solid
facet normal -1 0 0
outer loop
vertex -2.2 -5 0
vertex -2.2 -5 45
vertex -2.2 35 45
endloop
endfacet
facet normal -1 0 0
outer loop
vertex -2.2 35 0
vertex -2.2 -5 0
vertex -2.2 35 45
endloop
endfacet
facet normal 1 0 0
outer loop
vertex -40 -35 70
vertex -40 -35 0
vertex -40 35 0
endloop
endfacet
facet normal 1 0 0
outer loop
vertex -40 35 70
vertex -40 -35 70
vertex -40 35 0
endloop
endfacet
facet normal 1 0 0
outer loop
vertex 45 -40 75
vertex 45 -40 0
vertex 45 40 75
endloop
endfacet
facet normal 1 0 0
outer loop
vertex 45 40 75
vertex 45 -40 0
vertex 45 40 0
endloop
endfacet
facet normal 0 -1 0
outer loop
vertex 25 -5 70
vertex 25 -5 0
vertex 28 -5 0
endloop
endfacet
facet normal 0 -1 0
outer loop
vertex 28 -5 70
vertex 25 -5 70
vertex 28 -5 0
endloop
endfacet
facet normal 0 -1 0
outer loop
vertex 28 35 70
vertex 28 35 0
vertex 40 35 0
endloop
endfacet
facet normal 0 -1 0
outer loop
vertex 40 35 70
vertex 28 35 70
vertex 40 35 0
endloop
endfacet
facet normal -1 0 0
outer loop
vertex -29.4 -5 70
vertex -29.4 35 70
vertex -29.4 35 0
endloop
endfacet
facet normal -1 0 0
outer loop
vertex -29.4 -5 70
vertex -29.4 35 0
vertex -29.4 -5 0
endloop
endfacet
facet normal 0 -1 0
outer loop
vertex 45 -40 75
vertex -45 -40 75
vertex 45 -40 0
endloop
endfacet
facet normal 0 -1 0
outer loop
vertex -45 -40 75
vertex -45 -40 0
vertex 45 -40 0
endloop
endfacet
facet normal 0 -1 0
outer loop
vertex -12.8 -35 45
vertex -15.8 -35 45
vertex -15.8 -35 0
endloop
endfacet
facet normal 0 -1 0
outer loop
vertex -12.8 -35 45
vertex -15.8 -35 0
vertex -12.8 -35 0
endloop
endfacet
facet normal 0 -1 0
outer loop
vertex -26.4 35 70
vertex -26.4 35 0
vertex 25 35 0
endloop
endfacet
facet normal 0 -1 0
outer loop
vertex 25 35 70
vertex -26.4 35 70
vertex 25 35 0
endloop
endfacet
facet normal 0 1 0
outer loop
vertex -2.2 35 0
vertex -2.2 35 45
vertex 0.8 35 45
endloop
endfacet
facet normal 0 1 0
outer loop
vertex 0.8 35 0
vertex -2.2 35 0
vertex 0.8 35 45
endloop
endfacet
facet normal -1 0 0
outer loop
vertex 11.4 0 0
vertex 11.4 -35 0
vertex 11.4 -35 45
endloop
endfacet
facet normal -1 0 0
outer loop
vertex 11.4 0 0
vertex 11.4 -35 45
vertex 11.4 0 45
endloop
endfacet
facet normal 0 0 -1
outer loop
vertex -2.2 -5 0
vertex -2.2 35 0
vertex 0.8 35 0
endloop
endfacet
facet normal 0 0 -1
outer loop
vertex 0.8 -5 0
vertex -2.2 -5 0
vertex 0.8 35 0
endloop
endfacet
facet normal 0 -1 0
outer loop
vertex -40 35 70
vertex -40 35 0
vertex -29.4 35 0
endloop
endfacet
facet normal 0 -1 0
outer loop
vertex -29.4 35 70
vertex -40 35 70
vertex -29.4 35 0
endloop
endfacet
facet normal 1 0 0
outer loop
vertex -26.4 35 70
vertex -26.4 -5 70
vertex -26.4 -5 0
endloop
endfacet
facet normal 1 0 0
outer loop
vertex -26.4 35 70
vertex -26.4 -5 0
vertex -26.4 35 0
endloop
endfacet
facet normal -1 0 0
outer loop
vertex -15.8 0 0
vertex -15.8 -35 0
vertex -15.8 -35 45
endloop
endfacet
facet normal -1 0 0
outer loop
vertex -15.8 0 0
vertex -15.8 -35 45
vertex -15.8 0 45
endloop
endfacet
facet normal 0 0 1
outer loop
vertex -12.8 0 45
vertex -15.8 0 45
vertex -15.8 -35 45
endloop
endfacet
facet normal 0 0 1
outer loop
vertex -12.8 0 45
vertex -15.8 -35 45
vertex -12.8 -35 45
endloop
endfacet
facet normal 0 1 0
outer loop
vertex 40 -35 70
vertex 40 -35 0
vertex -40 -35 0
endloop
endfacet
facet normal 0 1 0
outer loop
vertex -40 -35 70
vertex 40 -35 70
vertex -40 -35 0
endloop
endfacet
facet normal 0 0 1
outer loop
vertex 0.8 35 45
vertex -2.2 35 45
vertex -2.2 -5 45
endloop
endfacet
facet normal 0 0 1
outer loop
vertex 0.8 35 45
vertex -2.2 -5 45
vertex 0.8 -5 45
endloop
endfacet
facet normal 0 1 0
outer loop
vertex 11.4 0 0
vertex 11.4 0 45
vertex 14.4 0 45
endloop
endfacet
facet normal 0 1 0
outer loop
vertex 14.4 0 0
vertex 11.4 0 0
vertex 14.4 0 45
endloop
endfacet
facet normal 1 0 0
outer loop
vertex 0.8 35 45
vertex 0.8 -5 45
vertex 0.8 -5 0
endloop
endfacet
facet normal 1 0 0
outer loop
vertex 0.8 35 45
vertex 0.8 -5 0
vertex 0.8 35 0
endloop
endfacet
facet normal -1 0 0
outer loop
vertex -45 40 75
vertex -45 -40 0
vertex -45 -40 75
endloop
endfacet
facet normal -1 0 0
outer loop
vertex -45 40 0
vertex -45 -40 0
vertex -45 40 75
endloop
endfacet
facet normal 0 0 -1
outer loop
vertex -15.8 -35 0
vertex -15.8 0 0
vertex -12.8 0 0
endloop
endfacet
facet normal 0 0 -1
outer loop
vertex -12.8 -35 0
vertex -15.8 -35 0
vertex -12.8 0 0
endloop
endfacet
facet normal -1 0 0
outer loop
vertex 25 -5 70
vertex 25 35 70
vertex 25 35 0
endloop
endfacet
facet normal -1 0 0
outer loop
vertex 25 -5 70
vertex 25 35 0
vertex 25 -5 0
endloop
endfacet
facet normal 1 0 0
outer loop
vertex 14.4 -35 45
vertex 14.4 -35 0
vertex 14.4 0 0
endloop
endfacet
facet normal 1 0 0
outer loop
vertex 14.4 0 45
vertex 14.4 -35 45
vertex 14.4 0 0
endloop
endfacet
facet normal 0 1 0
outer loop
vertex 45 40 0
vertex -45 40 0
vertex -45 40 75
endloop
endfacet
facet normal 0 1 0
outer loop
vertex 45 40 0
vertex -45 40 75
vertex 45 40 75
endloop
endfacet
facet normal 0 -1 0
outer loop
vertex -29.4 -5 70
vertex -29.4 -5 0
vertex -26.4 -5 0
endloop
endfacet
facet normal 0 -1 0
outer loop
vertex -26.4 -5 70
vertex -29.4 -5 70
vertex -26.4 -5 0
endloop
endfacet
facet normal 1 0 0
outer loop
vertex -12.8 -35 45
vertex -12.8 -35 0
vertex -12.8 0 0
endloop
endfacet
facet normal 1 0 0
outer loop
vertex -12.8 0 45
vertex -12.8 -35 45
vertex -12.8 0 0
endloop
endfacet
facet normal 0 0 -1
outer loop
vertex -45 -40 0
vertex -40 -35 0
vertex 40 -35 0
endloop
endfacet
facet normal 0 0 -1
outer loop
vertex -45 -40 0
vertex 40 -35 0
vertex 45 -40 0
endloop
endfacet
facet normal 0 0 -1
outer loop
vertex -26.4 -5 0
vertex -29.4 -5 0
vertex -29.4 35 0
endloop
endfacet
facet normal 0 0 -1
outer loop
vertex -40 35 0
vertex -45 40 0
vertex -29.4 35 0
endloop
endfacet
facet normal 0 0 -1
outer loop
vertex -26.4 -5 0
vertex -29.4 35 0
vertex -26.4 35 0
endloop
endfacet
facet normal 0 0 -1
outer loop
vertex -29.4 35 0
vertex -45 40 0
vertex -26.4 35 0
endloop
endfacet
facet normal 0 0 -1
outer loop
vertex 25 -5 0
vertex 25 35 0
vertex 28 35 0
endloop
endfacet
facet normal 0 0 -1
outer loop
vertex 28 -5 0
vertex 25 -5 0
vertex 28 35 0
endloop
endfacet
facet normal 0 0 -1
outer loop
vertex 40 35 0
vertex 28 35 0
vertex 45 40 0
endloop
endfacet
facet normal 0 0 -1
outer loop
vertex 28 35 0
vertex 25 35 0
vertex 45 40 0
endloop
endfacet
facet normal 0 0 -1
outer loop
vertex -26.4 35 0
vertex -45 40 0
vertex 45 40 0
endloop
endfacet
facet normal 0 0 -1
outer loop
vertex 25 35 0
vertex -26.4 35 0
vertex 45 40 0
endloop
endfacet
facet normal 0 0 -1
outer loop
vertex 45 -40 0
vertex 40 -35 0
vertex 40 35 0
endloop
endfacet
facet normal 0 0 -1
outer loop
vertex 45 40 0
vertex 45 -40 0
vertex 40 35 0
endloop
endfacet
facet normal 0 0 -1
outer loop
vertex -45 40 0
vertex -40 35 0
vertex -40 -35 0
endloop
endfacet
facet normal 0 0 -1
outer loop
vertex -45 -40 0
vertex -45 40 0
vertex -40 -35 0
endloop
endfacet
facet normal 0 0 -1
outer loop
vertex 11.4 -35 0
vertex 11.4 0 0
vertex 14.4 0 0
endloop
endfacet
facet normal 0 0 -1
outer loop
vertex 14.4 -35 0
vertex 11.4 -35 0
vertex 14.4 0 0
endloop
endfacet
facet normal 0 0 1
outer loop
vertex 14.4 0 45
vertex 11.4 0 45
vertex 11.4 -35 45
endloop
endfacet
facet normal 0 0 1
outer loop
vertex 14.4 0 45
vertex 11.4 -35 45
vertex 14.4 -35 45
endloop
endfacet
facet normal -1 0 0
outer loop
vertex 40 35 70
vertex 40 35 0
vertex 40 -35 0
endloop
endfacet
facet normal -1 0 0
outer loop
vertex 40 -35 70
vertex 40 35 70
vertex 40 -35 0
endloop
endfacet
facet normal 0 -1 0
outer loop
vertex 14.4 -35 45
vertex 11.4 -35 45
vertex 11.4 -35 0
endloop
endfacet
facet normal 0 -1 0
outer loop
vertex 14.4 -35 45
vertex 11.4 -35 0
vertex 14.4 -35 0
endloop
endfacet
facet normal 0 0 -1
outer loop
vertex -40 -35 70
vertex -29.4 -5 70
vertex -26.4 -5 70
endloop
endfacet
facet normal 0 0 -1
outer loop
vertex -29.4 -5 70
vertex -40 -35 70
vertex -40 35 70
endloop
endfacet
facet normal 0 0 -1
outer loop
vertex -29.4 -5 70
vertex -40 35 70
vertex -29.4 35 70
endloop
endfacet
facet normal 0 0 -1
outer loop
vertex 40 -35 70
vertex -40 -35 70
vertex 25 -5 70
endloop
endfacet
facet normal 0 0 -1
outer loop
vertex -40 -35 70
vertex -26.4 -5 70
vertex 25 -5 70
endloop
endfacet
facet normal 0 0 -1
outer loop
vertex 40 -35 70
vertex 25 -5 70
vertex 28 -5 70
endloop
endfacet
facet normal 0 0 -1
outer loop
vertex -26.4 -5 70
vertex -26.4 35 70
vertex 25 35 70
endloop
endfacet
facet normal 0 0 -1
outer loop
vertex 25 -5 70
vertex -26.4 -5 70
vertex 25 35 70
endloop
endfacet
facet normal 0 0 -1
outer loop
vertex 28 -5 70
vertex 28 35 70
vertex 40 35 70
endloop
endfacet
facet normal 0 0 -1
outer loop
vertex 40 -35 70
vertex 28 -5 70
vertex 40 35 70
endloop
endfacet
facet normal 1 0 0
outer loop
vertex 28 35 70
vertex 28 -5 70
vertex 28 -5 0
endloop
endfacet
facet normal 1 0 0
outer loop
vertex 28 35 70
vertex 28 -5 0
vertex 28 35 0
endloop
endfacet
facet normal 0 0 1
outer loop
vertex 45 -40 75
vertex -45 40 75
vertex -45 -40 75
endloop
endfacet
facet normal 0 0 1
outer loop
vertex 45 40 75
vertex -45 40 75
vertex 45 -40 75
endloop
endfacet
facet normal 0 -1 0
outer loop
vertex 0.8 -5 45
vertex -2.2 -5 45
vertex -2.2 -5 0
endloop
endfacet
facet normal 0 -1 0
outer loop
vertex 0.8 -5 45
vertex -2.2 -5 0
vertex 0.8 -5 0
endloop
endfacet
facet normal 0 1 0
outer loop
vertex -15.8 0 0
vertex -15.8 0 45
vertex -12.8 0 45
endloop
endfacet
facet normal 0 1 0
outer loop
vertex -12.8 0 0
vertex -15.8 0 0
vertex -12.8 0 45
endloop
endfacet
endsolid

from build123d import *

# Parameters (mm, degrees)
F0_W     = 3
F0_H     = 35
F0_H_2   = 40
F1_DEPTH = 45
F0_W_2   = 90
F0_H_3   = 80
F2_DEPTH = 70
F3_W     = 90
F3_H     = 80
F4_DEPTH = 5


with BuildPart() as f1:
    # F0 (on Top) → F1 (new body)
    with BuildSketch(Plane.XY):
        with Locations((-14.3, -17.5)):
            Rectangle(F0_W, F0_H)
        with Locations((-0.7, 15)):
            Rectangle(F0_W, F0_H_2)
        with Locations((12.9, -17.5)):
            Rectangle(F0_W, F0_H)
    extrude(amount=F1_DEPTH)


with BuildPart() as f2:
    # F0 (on Top) → F2 (new body)
    with BuildSketch(Plane.XY):
        Rectangle(F0_W_2, F0_H_3)
        Polygon((28, 35), (40, 35), (40, -35), (14.4, -35), (11.4, -35), (-12.8, -35), (-15.8, -35), (-40, -35), (-40, 35), (-29.4, 35), (-29.4, -5), (-26.4, -5), (-26.4, 35), (-2.2, 35), (0.8, 35), (25, 35), (25, -5), (28, -5), align=None, mode=Mode.SUBTRACT)
    extrude(amount=F2_DEPTH)

    # F3 (on face) → F4 (join)
    with BuildSketch(Plane.XY.offset(70)):
        Rectangle(F3_W, F3_H)
    extrude(amount=F4_DEPTH)


solid = Compound([f1.part, f2.part])
